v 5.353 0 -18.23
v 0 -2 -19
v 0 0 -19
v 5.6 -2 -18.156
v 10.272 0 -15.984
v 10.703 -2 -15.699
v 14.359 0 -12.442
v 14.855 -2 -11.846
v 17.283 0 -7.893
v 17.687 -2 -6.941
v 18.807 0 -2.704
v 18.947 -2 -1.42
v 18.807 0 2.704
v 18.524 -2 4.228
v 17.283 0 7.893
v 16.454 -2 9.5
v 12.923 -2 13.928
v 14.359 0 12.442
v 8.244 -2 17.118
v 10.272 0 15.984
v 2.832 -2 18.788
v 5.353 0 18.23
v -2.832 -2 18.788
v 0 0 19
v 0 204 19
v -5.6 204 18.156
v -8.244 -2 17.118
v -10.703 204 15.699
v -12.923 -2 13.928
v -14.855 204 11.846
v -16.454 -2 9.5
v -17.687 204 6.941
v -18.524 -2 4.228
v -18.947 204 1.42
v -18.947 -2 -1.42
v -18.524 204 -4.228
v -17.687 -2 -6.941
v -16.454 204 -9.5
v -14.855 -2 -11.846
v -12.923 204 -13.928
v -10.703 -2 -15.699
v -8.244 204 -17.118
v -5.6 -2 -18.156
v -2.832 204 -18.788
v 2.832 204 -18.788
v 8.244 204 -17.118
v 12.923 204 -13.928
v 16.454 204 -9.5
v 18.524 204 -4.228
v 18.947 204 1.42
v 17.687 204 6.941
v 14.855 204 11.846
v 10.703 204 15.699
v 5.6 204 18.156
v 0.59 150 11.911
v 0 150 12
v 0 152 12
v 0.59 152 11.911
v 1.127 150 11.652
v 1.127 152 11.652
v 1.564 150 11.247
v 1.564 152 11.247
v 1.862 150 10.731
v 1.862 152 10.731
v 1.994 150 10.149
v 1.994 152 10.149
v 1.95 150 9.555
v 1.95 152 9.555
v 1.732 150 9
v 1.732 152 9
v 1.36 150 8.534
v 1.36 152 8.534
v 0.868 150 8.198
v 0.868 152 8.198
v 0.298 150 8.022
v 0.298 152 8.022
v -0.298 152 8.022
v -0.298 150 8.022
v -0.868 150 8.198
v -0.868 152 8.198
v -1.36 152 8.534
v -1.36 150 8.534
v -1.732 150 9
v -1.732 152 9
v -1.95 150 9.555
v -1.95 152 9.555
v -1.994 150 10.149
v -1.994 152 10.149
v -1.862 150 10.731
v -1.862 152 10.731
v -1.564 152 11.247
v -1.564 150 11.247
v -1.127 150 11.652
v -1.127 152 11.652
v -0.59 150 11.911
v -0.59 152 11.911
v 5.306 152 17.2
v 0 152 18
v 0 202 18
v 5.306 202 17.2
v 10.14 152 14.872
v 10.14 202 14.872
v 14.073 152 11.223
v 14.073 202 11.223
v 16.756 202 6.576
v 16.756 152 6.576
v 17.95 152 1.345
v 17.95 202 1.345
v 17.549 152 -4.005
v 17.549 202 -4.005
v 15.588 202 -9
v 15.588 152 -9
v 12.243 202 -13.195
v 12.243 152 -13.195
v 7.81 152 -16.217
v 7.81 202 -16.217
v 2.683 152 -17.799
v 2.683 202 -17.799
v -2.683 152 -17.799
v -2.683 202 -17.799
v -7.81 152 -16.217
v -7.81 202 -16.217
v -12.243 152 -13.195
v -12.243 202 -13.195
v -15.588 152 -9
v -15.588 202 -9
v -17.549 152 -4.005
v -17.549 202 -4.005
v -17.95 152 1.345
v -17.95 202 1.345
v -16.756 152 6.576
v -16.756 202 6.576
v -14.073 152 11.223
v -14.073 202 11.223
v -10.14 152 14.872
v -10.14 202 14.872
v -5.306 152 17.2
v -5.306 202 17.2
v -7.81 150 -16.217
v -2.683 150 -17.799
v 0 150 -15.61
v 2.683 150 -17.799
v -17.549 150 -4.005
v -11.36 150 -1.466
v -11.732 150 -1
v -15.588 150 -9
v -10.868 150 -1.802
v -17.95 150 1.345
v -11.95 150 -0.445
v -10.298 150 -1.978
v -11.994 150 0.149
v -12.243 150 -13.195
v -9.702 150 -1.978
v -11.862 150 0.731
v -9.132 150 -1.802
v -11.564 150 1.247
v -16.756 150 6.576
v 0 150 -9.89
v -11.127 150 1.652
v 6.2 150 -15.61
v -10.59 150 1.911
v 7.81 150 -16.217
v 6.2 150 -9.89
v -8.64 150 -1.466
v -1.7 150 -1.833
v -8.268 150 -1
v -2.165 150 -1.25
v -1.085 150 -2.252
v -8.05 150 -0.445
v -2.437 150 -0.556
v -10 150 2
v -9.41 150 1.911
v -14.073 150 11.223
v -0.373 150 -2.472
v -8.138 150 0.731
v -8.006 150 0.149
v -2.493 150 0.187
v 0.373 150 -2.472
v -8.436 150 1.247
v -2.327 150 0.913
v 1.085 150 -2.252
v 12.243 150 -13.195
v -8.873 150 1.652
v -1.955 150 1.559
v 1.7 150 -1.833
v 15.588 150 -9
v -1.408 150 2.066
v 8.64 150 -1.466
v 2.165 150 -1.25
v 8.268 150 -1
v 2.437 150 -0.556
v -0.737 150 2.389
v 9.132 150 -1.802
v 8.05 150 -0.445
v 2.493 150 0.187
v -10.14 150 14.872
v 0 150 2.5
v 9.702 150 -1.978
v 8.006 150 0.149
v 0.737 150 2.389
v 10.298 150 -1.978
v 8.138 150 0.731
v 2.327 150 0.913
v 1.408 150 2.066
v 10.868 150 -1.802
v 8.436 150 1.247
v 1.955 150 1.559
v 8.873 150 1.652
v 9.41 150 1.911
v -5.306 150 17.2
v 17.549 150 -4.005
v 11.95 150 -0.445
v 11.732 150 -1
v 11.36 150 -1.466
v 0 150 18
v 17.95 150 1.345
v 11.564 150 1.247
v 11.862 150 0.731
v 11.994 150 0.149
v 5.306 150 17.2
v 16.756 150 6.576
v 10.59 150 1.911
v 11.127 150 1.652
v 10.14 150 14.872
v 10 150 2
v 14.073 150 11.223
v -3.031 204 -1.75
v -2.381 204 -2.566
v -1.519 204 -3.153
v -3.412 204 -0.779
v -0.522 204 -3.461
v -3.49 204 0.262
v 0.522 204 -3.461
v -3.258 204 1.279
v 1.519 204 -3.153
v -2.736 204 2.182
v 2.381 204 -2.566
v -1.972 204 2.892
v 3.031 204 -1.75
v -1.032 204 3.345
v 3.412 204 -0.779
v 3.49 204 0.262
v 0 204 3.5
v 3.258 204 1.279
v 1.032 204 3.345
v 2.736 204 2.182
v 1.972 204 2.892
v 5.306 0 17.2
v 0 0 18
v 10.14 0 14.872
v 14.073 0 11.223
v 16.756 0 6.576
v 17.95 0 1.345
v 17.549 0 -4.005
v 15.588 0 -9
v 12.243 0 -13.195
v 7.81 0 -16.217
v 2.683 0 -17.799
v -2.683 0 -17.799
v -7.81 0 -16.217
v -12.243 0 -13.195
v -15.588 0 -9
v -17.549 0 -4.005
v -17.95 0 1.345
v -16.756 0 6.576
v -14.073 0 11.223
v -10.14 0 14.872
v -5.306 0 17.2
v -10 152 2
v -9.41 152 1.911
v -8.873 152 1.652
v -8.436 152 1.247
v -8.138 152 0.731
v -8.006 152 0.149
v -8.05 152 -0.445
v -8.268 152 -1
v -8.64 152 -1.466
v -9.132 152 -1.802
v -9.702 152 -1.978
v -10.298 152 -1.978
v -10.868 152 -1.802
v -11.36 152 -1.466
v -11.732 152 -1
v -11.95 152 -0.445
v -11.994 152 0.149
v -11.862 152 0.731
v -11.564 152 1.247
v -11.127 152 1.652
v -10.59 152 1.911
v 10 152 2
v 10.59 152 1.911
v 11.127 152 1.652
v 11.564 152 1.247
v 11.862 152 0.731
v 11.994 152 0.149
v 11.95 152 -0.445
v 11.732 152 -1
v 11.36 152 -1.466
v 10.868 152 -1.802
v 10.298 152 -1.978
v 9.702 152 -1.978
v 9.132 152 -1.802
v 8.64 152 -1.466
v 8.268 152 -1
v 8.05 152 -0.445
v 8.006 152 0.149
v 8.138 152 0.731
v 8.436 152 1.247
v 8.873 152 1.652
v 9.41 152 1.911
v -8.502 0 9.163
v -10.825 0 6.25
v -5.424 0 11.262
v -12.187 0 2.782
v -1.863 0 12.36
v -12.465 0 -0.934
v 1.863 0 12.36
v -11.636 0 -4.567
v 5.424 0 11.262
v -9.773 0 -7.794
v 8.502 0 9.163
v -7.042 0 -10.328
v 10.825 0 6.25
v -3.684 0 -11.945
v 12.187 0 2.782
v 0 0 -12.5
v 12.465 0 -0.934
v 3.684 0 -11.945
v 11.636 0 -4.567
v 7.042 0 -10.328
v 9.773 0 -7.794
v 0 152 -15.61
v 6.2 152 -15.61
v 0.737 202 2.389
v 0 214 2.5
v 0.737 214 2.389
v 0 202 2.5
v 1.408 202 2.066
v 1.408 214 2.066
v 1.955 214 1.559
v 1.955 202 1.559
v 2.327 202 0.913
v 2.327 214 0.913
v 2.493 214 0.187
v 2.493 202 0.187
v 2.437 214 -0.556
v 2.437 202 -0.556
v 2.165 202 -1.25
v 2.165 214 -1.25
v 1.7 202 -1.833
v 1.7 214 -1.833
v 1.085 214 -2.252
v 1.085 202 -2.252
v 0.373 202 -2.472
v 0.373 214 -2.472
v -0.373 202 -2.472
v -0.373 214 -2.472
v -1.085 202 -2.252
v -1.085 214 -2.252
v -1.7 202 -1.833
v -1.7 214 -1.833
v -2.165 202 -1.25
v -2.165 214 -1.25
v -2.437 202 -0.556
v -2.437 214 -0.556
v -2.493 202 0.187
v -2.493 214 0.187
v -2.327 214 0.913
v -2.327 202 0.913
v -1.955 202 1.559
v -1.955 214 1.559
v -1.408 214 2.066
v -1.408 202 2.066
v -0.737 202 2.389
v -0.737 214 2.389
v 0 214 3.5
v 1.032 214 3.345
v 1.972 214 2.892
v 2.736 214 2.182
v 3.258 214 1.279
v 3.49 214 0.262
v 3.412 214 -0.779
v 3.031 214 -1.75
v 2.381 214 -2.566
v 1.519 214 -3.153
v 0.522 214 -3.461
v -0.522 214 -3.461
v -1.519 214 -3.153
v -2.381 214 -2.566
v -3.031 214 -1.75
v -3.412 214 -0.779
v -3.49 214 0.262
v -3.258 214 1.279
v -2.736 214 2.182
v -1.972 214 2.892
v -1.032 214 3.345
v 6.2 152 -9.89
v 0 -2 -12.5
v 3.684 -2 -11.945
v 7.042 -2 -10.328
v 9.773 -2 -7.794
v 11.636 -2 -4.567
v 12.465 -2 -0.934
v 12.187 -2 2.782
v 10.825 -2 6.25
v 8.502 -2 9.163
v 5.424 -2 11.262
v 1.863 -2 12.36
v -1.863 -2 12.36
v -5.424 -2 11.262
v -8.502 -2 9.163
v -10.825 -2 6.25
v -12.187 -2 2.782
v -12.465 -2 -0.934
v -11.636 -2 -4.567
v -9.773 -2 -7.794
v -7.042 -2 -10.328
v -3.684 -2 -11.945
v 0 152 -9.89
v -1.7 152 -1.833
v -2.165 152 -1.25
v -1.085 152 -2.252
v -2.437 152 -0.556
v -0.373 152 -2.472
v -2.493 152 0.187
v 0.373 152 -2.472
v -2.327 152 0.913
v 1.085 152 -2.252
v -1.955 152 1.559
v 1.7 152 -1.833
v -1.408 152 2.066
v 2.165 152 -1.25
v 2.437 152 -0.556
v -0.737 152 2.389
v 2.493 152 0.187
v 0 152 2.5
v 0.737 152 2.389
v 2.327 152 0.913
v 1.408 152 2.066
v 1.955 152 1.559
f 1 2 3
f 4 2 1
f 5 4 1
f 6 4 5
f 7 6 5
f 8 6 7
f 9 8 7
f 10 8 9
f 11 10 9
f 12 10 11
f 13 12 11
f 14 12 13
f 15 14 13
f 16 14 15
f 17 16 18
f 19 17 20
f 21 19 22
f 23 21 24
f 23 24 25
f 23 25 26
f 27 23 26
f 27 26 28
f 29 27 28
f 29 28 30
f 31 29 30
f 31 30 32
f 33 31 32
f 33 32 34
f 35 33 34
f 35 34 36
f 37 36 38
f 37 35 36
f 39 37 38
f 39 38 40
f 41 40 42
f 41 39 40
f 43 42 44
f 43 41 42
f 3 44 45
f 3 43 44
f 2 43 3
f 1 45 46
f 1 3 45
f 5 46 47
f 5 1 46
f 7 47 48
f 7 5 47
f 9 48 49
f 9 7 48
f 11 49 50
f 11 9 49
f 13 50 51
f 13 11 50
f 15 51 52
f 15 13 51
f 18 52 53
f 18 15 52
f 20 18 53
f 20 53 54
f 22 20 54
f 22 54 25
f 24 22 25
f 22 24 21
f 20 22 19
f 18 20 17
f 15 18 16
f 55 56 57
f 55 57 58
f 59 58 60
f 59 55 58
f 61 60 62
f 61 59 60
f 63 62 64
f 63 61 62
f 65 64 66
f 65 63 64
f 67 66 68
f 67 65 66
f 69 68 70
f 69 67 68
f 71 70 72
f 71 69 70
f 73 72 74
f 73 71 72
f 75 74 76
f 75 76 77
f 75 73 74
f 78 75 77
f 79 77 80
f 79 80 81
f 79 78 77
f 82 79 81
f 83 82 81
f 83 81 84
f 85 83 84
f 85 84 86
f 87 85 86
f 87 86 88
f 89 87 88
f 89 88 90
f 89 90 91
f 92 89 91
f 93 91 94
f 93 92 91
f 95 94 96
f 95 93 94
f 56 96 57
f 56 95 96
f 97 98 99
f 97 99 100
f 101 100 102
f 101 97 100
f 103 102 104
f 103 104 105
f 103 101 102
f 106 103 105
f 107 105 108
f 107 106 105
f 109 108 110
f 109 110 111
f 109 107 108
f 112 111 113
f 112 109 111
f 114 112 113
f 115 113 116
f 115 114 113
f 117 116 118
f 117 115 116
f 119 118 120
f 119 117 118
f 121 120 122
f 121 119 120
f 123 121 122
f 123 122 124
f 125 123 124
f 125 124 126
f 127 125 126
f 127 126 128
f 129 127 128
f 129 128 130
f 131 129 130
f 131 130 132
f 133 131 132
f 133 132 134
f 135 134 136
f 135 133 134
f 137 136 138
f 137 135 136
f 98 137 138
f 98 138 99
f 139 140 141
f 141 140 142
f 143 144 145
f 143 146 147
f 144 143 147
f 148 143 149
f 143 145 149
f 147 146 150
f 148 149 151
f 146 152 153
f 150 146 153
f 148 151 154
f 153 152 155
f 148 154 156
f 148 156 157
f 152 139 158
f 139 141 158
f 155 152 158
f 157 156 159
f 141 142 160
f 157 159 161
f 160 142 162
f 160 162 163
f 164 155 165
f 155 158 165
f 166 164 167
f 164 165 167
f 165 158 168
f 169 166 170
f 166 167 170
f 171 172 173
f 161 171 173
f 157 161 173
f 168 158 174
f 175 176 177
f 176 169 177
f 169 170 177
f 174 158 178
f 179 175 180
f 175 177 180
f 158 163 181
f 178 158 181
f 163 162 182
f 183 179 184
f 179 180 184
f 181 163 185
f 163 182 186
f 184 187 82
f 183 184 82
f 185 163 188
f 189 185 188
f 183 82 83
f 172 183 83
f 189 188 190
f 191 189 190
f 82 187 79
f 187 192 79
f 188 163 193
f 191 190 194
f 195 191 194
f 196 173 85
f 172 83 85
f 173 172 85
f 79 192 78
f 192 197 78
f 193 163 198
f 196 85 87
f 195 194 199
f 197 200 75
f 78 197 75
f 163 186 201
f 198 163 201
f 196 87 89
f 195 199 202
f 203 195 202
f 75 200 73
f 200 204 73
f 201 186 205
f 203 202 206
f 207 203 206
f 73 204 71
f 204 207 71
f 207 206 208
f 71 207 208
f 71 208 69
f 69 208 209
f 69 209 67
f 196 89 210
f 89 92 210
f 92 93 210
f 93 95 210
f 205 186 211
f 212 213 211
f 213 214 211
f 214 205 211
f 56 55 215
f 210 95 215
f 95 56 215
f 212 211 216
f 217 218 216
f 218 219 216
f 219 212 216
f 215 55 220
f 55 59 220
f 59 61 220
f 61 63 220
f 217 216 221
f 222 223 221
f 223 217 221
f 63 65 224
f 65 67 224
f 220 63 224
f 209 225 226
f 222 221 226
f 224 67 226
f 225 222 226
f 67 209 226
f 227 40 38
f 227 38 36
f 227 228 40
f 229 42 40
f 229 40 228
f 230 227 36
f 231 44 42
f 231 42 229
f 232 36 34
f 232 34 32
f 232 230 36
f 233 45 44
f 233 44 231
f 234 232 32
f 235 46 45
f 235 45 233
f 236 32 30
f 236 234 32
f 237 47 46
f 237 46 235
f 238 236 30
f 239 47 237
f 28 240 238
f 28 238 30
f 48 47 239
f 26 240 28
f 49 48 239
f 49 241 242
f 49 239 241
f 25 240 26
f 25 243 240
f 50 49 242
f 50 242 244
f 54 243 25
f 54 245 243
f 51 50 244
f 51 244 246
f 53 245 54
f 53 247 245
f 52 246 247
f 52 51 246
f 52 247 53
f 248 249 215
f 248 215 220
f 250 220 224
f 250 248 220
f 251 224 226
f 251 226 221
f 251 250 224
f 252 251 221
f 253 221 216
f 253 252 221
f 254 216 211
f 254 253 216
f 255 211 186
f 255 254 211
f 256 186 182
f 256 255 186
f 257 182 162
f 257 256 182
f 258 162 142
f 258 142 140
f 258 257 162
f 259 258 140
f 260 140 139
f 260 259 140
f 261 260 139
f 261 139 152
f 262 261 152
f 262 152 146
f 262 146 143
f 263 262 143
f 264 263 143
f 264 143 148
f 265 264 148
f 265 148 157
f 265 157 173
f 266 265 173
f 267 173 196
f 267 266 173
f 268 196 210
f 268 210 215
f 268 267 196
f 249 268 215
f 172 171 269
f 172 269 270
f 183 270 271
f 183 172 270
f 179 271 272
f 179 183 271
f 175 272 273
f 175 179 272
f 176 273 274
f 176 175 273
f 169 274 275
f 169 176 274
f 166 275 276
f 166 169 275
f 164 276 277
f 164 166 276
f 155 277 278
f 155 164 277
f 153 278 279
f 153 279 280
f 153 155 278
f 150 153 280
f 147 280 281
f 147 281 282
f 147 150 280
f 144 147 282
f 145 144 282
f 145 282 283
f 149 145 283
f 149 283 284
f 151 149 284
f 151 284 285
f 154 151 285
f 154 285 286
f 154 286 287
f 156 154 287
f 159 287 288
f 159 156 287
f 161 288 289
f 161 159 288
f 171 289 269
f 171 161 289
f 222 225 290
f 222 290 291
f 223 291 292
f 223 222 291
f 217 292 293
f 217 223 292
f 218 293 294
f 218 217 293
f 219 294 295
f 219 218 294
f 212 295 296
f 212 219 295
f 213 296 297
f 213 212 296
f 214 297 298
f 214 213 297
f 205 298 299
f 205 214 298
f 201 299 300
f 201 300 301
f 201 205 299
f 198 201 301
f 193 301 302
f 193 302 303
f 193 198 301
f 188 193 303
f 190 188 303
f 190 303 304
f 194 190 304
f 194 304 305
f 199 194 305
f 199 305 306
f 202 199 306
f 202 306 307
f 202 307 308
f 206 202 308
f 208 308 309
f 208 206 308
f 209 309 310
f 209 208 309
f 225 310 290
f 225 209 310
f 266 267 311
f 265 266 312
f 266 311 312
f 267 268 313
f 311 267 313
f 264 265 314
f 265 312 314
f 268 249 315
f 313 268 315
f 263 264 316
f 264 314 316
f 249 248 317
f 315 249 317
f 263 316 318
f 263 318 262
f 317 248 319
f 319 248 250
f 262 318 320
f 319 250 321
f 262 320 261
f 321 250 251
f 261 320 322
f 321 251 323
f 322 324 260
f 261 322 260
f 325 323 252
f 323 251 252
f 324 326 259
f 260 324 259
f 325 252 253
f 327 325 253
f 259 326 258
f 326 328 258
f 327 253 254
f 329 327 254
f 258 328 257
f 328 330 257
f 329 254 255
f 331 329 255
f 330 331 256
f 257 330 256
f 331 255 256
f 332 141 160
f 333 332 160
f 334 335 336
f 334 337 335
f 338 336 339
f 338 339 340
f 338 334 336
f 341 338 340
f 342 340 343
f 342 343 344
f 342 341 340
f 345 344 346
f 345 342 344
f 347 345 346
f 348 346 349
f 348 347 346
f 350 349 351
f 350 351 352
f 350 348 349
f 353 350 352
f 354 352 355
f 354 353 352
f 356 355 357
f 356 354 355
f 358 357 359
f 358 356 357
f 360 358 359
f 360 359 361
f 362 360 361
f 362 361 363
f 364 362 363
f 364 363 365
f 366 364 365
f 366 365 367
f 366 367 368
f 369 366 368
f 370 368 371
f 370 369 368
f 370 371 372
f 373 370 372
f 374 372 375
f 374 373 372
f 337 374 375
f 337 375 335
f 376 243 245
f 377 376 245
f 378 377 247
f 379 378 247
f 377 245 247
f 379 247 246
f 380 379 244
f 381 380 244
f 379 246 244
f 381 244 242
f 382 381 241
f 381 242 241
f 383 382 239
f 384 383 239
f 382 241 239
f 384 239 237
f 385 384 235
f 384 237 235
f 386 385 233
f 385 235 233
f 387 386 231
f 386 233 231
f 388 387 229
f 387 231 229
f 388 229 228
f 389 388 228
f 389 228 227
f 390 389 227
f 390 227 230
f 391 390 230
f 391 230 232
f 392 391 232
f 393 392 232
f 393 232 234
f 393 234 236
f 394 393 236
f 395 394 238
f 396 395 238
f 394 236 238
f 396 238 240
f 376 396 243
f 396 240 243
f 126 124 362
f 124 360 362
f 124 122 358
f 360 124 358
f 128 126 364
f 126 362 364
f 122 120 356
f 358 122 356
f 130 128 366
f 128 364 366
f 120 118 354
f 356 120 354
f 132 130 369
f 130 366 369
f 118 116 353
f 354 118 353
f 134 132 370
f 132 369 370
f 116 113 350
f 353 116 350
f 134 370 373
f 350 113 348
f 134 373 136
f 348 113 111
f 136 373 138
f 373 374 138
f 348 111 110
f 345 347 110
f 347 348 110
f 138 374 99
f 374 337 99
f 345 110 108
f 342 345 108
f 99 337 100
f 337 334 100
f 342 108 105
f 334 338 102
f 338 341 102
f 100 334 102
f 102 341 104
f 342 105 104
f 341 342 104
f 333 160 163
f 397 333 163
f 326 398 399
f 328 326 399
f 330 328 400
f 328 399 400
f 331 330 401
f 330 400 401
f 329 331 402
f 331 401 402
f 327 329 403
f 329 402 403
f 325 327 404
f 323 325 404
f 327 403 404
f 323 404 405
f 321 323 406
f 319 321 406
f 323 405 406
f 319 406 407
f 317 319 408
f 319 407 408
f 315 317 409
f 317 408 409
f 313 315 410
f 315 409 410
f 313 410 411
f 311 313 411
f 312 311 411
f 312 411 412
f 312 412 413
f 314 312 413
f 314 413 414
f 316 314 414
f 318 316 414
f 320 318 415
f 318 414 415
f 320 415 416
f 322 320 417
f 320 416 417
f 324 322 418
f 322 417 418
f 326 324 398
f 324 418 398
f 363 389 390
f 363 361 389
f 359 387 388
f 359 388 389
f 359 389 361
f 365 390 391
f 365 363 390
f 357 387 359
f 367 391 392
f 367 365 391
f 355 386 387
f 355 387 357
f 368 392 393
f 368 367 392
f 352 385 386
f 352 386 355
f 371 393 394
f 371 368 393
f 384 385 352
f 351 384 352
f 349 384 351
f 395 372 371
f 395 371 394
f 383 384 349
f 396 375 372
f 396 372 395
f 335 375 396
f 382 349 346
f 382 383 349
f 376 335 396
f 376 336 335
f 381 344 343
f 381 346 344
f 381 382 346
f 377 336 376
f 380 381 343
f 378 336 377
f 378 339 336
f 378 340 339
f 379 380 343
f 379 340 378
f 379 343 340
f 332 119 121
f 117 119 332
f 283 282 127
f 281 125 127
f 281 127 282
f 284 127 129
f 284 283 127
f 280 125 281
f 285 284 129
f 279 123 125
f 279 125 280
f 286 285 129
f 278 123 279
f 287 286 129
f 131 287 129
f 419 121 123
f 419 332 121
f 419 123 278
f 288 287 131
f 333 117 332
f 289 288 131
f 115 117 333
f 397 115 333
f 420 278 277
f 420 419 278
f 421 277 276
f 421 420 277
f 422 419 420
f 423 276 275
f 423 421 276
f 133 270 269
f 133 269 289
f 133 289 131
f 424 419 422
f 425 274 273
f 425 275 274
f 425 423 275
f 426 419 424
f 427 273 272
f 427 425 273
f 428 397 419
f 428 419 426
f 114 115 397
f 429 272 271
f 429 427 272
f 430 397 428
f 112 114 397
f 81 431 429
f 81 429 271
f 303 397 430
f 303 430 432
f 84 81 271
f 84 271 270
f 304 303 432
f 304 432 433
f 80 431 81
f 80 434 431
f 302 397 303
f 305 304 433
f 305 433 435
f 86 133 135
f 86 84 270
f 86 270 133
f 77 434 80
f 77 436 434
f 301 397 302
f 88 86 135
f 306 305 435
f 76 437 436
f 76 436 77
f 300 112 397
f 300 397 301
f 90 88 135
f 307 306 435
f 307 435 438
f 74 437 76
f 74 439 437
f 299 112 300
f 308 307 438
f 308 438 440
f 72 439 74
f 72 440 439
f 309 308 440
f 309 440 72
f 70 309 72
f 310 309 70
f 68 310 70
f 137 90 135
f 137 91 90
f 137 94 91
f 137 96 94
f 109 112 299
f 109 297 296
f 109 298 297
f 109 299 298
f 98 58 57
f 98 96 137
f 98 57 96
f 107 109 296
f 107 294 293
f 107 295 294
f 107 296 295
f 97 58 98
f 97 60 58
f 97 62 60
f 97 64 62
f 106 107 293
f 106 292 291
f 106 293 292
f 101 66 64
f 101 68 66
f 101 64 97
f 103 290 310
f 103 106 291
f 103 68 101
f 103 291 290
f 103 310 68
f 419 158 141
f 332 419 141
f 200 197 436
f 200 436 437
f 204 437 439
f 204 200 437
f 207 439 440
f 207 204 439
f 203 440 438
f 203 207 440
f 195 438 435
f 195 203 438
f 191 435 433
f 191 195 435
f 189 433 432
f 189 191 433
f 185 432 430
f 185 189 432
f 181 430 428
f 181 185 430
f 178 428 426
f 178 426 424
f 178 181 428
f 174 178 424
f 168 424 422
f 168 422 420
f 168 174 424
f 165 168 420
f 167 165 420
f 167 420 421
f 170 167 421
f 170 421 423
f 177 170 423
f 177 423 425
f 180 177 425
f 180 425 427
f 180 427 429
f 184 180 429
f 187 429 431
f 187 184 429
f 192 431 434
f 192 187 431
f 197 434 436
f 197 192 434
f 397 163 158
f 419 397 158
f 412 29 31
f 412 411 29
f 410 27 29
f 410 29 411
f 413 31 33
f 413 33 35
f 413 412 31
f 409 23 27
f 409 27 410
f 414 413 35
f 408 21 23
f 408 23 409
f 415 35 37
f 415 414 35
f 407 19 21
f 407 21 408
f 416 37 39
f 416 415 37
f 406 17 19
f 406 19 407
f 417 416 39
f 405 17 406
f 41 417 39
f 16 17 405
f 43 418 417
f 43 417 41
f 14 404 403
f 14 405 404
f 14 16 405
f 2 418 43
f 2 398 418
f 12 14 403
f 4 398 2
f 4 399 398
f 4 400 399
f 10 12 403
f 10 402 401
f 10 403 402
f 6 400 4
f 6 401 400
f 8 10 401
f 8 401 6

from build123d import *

# Parameters (mm, degrees)
SKETCH_1_R      = 19
SKETCH_1_R_2    = 18
EXTRUDE_1_DEPTH = 150
SKETCH_2_R      = 19
SKETCH_2_R_2    = 2
SKETCH_2_R_3    = 2.5
EXTRUDE_2_DEPTH = 2
SKETCH_3_R      = 19
SKETCH_3_R_2    = 18
EXTRUDE_3_DEPTH = 50
SKETCH_4_R      = 19
SKETCH_4_R_2    = 2.5
EXTRUDE_4_DEPTH = 2
SKETCH_5_R      = 3.5
SKETCH_5_R_2    = 2.5
EXTRUDE_5_DEPTH = 10
EXTRUDE_START   = 2
SKETCH_6_R      = 19
SKETCH_6_R_2    = 12.5
EXTRUDE_6_DEPTH = 2


with BuildPart() as part:
    # 草图1 → 凸台-拉伸1 (new body)
    with BuildSketch(Plane(origin=(0, 0, 0), x_dir=(1, 0, 0), z_dir=(0, 1, 0))):
        with Locations(Location((0, 0, 0), (0, 0, 270))):
            Circle(SKETCH_1_R)
        with Locations(Location((0, 0, 0), (0, 0, 270))):
            Circle(SKETCH_1_R_2, mode=Mode.SUBTRACT)
    extrude(amount=EXTRUDE_1_DEPTH)

    # 草图2 → 凸台-拉伸2 (add)
    with BuildSketch(Plane(origin=(0, 150, 0), x_dir=(1, 0, 0), z_dir=(0, 1, 0))):
        with Locations(Location((0, 0, 0), (0, 0, 270))):
            Circle(SKETCH_2_R)
        with Locations(Location((10, 0, 0), (0, 0, 270))):
            Circle(SKETCH_2_R_2, mode=Mode.SUBTRACT)
        with Locations(Location((-10, 0, 0), (0, 0, 270))):
            Circle(SKETCH_2_R_2, mode=Mode.SUBTRACT)
        with Locations(Location((0, -10, 0), (0, 0, 270))):
            Circle(SKETCH_2_R_2, mode=Mode.SUBTRACT)
        with Locations(Location((0, 0, 0), (0, 0, 270))):
            Circle(SKETCH_2_R_3, mode=Mode.SUBTRACT)
        Polygon((0, 10), (0, 15.61), (6.2, 15.61), (6.2, 9.89), (0, 9.89), align=None, mode=Mode.SUBTRACT)
    extrude(amount=EXTRUDE_2_DEPTH)

    # 草图3 → 凸台-拉伸3 (add)
    with BuildSketch(Plane(origin=(0, 152, 0), x_dir=(1, 0, 0), z_dir=(0, 1, 0))):
        with Locations(Location((0, 0, 0), (0, 0, 270))):
            Circle(SKETCH_3_R)
        with Locations(Location((0, 0, 0), (0, 0, 270))):
            Circle(SKETCH_3_R_2, mode=Mode.SUBTRACT)
    extrude(amount=EXTRUDE_3_DEPTH)

    # 草图4 → 凸台-拉伸4 (add)
    with BuildSketch(Plane(origin=(0, 202, 0), x_dir=(1, 0, 0), z_dir=(0, 1, 0))):
        with Locations(Location((0, 0, 0), (0, 0, 270))):
            Circle(SKETCH_4_R)
        with Locations(Location((0, 0, 0), (0, 0, 270))):
            Circle(SKETCH_4_R_2, mode=Mode.SUBTRACT)
    extrude(amount=EXTRUDE_4_DEPTH)

    # 草图5 → 凸台-拉伸5 (add)
    with BuildSketch(Plane(origin=(0, 204, 0), x_dir=(1, 0, 0), z_dir=(0, 1, 0))):
        with Locations(Location((0, 0, 0), (0, 0, 270))):
            Circle(SKETCH_5_R)
        with Locations(Location((0, 0, 0), (0, 0, 270))):
            Circle(SKETCH_5_R_2, mode=Mode.SUBTRACT)
    extrude(amount=EXTRUDE_5_DEPTH)

    # 草图6 → 凸台-拉伸6 (add)
    with BuildSketch(Plane.XZ.offset(EXTRUDE_START)):
        with Locations(Location((0, 0, 0), (0, 0, 270))):
            Circle(SKETCH_6_R)
        with Locations(Location((0, 0, 0), (0, 0, 270))):
            Circle(SKETCH_6_R_2, mode=Mode.SUBTRACT)
    extrude(amount=-EXTRUDE_6_DEPTH)


solid = part.part
